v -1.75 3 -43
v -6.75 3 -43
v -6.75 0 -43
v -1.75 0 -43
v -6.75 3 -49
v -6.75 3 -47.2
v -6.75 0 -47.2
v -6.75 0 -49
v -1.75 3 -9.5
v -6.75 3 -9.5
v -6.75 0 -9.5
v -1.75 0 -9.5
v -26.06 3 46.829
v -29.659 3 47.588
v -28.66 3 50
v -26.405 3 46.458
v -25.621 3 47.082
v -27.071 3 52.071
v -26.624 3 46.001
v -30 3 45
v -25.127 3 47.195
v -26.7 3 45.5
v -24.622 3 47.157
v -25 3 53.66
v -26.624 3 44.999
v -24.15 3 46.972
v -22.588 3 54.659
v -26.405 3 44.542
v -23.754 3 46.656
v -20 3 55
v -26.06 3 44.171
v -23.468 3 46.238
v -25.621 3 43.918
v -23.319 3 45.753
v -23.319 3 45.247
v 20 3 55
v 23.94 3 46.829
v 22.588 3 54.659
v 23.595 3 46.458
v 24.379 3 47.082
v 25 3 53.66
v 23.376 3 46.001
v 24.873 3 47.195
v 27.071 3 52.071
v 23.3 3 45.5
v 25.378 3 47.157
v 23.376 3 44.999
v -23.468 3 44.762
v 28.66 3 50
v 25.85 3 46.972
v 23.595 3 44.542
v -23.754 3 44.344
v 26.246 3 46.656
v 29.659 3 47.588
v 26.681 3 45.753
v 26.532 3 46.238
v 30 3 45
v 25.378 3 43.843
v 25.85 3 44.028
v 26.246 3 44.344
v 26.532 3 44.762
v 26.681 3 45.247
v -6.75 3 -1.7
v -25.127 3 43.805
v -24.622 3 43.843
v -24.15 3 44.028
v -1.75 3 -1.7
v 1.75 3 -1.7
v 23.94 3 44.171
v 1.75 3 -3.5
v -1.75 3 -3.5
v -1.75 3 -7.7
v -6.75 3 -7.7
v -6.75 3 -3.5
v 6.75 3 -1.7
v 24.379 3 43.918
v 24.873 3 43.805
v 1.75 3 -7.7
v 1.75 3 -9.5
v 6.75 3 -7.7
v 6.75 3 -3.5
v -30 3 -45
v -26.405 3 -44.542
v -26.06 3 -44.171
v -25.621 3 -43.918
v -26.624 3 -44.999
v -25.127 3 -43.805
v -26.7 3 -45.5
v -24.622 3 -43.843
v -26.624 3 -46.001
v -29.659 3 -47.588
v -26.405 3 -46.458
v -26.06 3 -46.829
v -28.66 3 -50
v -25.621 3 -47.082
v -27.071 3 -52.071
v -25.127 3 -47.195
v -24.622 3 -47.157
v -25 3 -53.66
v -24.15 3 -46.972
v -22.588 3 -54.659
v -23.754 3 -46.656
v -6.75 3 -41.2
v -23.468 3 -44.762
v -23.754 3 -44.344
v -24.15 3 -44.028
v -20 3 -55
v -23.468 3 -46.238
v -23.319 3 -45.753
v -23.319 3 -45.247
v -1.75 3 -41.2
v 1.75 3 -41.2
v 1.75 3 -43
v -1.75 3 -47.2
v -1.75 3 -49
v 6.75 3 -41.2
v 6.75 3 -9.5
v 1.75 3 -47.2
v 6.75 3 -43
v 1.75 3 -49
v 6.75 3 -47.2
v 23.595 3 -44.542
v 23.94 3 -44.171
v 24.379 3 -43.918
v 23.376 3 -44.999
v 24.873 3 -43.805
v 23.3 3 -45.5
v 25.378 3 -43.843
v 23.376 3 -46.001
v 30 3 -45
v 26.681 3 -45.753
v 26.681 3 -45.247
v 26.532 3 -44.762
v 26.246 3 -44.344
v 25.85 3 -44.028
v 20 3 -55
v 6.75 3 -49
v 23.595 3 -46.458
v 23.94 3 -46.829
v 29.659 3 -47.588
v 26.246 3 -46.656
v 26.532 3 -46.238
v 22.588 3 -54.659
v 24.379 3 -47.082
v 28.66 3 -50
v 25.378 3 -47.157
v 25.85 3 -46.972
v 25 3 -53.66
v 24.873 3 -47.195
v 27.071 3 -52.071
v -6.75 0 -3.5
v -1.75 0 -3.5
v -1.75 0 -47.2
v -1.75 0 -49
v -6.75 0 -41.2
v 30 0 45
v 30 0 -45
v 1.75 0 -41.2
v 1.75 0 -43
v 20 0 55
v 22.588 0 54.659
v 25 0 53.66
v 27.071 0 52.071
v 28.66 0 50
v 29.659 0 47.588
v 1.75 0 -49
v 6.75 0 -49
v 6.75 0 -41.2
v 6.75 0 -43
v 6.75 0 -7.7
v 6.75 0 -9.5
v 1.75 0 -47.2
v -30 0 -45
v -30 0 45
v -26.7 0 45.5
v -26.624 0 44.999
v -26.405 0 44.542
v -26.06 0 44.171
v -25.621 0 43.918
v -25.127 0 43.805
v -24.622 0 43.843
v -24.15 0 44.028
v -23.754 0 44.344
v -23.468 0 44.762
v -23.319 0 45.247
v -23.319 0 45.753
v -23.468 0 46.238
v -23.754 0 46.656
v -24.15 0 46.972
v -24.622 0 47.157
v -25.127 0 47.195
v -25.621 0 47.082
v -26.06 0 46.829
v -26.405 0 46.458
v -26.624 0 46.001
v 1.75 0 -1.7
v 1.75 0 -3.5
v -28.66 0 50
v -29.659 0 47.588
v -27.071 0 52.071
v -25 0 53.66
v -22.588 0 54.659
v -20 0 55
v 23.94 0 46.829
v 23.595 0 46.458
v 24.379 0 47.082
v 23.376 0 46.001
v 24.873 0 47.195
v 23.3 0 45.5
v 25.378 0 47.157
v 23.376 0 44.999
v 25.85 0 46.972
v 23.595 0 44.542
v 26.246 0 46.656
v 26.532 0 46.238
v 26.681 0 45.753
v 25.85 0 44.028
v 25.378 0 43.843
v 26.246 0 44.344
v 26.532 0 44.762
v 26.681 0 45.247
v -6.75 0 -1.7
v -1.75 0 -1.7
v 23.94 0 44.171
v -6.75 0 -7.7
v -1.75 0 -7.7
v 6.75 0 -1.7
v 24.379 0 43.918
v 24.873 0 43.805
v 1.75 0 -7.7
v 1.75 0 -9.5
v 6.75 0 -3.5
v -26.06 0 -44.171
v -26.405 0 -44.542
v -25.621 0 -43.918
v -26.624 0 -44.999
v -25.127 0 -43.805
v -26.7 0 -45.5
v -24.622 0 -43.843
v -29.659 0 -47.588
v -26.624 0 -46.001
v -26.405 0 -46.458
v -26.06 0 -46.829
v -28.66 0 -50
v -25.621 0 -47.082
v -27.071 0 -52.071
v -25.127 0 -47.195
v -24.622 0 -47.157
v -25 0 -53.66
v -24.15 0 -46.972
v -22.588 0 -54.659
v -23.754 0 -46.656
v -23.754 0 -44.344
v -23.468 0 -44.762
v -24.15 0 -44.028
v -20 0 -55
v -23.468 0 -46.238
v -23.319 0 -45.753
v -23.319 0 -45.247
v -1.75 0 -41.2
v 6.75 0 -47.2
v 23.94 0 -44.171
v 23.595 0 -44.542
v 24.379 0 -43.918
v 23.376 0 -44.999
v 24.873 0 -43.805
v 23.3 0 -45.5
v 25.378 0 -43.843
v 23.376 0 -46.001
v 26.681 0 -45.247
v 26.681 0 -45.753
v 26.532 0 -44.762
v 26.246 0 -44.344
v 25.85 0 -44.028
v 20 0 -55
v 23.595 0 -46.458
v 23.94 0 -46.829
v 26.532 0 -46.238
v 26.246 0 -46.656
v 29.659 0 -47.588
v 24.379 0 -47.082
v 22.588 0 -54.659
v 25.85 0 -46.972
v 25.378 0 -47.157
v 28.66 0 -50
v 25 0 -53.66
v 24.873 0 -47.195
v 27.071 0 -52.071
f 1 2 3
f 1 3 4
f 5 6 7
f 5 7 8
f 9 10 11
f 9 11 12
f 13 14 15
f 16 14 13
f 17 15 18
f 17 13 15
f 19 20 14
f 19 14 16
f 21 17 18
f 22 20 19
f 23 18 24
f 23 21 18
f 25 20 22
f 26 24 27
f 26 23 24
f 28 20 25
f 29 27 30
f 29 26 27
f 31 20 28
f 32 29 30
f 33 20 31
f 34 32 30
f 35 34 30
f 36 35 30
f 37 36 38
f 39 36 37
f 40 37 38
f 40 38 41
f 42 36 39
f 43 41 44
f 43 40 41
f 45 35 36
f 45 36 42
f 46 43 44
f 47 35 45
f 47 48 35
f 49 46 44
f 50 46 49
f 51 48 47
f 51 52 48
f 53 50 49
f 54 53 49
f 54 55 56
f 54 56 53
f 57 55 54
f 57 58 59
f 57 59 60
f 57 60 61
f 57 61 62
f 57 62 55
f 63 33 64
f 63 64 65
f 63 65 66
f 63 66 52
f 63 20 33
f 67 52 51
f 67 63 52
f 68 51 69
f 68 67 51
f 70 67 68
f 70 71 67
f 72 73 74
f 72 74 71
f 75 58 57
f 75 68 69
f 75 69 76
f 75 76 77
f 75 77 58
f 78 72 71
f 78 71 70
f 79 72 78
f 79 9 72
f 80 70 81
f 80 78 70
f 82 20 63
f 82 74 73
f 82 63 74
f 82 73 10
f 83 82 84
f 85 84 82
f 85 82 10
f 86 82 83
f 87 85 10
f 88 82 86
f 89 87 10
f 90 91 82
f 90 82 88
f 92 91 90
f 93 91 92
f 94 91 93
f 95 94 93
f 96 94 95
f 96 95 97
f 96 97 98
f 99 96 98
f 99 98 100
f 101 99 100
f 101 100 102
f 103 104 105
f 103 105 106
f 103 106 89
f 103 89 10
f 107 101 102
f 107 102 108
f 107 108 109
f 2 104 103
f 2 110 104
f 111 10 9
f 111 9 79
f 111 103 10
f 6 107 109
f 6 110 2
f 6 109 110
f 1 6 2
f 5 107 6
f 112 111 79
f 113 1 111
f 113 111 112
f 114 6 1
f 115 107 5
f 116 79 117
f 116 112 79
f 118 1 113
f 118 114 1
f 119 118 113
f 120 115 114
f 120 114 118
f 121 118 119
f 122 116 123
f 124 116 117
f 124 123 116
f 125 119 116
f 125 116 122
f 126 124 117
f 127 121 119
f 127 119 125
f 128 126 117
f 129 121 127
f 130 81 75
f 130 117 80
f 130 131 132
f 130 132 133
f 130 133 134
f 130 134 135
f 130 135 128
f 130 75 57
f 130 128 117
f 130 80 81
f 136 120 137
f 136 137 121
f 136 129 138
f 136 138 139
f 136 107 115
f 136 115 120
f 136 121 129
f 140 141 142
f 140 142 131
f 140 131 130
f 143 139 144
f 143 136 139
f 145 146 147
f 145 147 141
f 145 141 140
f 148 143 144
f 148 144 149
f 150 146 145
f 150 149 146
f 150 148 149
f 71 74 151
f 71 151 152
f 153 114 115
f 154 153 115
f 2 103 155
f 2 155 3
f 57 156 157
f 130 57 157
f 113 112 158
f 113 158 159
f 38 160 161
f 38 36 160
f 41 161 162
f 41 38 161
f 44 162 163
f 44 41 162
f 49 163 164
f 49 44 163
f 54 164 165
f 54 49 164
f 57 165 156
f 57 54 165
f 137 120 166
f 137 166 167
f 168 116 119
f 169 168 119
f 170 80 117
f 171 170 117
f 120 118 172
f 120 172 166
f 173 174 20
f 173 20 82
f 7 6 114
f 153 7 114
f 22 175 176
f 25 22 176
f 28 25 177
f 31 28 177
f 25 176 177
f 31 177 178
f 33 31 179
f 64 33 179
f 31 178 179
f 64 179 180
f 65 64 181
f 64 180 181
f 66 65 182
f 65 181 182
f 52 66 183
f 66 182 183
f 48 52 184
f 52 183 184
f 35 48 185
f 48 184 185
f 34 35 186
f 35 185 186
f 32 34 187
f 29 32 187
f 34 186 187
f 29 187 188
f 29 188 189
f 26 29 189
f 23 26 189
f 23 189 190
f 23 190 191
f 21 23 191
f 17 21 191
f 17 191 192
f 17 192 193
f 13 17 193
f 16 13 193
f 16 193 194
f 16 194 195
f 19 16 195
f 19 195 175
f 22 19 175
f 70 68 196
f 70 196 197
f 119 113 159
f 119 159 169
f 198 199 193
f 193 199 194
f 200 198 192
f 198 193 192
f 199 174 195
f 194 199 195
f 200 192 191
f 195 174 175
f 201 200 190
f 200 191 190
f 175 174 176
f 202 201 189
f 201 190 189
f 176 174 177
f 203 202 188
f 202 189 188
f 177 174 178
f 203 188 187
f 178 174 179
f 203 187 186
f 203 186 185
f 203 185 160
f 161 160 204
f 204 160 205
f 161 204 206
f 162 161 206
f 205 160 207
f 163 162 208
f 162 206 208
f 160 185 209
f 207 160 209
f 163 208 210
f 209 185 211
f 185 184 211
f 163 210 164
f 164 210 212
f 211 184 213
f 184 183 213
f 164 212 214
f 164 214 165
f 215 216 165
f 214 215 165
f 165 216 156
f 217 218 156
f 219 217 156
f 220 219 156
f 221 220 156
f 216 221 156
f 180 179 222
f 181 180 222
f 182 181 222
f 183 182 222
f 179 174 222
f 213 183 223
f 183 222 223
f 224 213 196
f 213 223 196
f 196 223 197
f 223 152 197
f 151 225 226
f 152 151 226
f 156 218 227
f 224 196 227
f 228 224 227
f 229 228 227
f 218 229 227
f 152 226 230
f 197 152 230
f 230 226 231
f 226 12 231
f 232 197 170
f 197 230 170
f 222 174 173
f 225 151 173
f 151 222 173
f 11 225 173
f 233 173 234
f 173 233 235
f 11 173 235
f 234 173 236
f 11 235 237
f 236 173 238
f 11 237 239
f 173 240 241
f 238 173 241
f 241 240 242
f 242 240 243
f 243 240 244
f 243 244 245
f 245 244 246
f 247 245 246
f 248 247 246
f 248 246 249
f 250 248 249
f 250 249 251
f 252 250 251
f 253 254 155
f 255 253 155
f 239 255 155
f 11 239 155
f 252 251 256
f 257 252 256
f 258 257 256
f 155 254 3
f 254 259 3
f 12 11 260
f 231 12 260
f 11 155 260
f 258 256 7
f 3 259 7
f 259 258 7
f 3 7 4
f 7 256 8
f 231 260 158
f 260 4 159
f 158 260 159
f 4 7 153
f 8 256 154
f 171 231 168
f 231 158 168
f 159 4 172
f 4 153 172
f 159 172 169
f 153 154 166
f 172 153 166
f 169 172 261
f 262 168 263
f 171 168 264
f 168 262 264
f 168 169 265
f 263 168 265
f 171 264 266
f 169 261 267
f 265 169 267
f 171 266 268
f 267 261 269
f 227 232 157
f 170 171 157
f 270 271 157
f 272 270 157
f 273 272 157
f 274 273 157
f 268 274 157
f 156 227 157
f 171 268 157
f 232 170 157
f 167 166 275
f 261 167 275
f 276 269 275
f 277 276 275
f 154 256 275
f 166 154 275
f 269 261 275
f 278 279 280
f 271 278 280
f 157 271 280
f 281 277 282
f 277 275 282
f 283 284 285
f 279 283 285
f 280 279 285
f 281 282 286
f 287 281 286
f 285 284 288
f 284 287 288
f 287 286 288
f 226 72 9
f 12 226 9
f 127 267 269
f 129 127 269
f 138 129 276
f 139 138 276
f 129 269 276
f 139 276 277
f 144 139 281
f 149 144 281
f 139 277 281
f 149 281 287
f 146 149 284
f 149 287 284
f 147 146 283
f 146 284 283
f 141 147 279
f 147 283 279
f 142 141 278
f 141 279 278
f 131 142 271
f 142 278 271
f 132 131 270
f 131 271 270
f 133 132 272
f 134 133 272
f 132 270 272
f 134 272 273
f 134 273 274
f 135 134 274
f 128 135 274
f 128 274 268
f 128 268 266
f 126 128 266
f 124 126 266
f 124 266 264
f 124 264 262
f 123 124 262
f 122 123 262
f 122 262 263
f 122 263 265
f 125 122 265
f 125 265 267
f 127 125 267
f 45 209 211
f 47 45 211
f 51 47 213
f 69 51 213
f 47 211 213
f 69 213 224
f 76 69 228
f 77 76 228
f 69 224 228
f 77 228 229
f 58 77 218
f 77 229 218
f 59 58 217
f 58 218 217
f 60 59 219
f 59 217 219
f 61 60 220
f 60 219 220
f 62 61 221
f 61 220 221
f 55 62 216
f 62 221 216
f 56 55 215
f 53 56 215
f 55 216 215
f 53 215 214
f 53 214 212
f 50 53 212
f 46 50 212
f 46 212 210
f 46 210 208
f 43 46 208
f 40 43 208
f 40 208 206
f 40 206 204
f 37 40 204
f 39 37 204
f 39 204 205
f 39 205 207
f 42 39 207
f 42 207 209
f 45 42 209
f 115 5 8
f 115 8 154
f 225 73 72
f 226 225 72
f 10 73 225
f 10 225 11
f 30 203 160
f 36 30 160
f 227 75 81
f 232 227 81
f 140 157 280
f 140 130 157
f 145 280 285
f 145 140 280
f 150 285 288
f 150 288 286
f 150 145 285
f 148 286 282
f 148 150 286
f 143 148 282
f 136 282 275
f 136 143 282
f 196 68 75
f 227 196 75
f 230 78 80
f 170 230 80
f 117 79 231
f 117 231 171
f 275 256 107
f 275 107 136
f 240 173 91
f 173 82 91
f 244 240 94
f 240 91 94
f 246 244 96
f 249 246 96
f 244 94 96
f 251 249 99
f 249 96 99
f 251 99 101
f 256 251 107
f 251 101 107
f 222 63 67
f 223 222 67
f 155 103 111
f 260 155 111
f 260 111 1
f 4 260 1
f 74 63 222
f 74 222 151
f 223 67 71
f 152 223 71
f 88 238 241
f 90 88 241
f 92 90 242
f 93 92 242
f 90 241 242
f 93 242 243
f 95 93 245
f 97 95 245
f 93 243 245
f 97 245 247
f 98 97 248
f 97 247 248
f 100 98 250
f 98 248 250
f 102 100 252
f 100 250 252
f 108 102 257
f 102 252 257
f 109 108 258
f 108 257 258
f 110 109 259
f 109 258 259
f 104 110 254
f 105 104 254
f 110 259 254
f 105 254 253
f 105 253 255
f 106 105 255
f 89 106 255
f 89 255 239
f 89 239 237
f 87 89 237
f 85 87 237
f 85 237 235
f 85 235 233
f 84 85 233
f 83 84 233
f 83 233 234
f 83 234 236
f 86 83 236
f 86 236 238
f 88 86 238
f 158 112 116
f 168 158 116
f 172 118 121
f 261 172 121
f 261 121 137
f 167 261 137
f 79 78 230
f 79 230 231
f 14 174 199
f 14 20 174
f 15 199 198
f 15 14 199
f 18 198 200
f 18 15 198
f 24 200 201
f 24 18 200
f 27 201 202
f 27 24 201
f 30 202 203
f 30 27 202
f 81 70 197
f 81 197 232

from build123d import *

# Parameters (mm, degrees)
SKETCH1_W             = 60
SKETCH1_H             = 110
BOSS_EXTRUDE1_DEPTH   = 3
FILLET2_R             = 10
M3_CLEARANCE_HOLE1_D  = 3.4
DELETEFACE1_OUTLINE_R = 1.7
DELETEFACE1_DEPTH     = 3
SKETCH6_W             = 5
SKETCH6_H             = 1.8
CUT_EXTRUDE3_DEPTH    = 63.721607122


# Read off the part's stored shape, not the designer's step: DeleteFace1
with BuildPart() as part:
    # Sketch1 → Boss-Extrude1 (new body)
    with BuildSketch(Plane(origin=(0, 0, 0), x_dir=(1, 0, 0), z_dir=(0, 1, 0))):
        Rectangle(SKETCH1_W, SKETCH1_H)
    extrude(amount=BOSS_EXTRUDE1_DEPTH)

    # Fillet2
    fillet2_edges = [part.edges().sort_by_distance(p)[0] for p in [
        (30, 1.5, 55),
        (-30, 1.5, 55),
        (-30, 1.5, -55),
        (30, 1.5, -55),
    ]]
    fillet(fillet2_edges, radius=FILLET2_R)

    # M3 Clearance Hole1 (through all)
    with Locations(Plane(origin=(0, 3, 0), x_dir=(1, 0, 0), z_dir=(0, 1, 0))):
        with Locations((0, 0), (25, 45.5), (-25, -45.5), (-25, 45.5), (25, -45.5)):
            Hole(M3_CLEARANCE_HOLE1_D / 2)

    # DeleteFace1 outline → DeleteFace1 (add)
    with BuildSketch(Plane(origin=(0, 0, 0), x_dir=(1, 0, 0), z_dir=(0, 1, 0))):
        Circle(DELETEFACE1_OUTLINE_R)
    extrude(amount=DELETEFACE1_DEPTH)

    # Sketch6 → Cut-Extrude3 (cut, through all)
    with BuildSketch(Plane(origin=(0, 3, 0), x_dir=(1, 0, 0), z_dir=(0, 1, 0))):
        with Locations((-4.25, 2.6)):
            Rectangle(SKETCH6_W, SKETCH6_H)
        with Locations((4.25, 2.6)):
            Rectangle(SKETCH6_W, SKETCH6_H)
        with Locations((4.25, 8.6)):
            Rectangle(SKETCH6_W, SKETCH6_H)
        with Locations((-4.25, 8.6)):
            Rectangle(SKETCH6_W, SKETCH6_H)
        with Locations((-4.25, 42.1)):
            Rectangle(SKETCH6_W, SKETCH6_H)
        with Locations((-4.25, 48.1)):
            Rectangle(SKETCH6_W, SKETCH6_H)
        with Locations((4.25, 48.1)):
            Rectangle(SKETCH6_W, SKETCH6_H)
        with Locations((4.25, 42.1)):
            Rectangle(SKETCH6_W, SKETCH6_H)
    extrude(amount=-CUT_EXTRUDE3_DEPTH, mode=Mode.SUBTRACT)


solid = part.part
